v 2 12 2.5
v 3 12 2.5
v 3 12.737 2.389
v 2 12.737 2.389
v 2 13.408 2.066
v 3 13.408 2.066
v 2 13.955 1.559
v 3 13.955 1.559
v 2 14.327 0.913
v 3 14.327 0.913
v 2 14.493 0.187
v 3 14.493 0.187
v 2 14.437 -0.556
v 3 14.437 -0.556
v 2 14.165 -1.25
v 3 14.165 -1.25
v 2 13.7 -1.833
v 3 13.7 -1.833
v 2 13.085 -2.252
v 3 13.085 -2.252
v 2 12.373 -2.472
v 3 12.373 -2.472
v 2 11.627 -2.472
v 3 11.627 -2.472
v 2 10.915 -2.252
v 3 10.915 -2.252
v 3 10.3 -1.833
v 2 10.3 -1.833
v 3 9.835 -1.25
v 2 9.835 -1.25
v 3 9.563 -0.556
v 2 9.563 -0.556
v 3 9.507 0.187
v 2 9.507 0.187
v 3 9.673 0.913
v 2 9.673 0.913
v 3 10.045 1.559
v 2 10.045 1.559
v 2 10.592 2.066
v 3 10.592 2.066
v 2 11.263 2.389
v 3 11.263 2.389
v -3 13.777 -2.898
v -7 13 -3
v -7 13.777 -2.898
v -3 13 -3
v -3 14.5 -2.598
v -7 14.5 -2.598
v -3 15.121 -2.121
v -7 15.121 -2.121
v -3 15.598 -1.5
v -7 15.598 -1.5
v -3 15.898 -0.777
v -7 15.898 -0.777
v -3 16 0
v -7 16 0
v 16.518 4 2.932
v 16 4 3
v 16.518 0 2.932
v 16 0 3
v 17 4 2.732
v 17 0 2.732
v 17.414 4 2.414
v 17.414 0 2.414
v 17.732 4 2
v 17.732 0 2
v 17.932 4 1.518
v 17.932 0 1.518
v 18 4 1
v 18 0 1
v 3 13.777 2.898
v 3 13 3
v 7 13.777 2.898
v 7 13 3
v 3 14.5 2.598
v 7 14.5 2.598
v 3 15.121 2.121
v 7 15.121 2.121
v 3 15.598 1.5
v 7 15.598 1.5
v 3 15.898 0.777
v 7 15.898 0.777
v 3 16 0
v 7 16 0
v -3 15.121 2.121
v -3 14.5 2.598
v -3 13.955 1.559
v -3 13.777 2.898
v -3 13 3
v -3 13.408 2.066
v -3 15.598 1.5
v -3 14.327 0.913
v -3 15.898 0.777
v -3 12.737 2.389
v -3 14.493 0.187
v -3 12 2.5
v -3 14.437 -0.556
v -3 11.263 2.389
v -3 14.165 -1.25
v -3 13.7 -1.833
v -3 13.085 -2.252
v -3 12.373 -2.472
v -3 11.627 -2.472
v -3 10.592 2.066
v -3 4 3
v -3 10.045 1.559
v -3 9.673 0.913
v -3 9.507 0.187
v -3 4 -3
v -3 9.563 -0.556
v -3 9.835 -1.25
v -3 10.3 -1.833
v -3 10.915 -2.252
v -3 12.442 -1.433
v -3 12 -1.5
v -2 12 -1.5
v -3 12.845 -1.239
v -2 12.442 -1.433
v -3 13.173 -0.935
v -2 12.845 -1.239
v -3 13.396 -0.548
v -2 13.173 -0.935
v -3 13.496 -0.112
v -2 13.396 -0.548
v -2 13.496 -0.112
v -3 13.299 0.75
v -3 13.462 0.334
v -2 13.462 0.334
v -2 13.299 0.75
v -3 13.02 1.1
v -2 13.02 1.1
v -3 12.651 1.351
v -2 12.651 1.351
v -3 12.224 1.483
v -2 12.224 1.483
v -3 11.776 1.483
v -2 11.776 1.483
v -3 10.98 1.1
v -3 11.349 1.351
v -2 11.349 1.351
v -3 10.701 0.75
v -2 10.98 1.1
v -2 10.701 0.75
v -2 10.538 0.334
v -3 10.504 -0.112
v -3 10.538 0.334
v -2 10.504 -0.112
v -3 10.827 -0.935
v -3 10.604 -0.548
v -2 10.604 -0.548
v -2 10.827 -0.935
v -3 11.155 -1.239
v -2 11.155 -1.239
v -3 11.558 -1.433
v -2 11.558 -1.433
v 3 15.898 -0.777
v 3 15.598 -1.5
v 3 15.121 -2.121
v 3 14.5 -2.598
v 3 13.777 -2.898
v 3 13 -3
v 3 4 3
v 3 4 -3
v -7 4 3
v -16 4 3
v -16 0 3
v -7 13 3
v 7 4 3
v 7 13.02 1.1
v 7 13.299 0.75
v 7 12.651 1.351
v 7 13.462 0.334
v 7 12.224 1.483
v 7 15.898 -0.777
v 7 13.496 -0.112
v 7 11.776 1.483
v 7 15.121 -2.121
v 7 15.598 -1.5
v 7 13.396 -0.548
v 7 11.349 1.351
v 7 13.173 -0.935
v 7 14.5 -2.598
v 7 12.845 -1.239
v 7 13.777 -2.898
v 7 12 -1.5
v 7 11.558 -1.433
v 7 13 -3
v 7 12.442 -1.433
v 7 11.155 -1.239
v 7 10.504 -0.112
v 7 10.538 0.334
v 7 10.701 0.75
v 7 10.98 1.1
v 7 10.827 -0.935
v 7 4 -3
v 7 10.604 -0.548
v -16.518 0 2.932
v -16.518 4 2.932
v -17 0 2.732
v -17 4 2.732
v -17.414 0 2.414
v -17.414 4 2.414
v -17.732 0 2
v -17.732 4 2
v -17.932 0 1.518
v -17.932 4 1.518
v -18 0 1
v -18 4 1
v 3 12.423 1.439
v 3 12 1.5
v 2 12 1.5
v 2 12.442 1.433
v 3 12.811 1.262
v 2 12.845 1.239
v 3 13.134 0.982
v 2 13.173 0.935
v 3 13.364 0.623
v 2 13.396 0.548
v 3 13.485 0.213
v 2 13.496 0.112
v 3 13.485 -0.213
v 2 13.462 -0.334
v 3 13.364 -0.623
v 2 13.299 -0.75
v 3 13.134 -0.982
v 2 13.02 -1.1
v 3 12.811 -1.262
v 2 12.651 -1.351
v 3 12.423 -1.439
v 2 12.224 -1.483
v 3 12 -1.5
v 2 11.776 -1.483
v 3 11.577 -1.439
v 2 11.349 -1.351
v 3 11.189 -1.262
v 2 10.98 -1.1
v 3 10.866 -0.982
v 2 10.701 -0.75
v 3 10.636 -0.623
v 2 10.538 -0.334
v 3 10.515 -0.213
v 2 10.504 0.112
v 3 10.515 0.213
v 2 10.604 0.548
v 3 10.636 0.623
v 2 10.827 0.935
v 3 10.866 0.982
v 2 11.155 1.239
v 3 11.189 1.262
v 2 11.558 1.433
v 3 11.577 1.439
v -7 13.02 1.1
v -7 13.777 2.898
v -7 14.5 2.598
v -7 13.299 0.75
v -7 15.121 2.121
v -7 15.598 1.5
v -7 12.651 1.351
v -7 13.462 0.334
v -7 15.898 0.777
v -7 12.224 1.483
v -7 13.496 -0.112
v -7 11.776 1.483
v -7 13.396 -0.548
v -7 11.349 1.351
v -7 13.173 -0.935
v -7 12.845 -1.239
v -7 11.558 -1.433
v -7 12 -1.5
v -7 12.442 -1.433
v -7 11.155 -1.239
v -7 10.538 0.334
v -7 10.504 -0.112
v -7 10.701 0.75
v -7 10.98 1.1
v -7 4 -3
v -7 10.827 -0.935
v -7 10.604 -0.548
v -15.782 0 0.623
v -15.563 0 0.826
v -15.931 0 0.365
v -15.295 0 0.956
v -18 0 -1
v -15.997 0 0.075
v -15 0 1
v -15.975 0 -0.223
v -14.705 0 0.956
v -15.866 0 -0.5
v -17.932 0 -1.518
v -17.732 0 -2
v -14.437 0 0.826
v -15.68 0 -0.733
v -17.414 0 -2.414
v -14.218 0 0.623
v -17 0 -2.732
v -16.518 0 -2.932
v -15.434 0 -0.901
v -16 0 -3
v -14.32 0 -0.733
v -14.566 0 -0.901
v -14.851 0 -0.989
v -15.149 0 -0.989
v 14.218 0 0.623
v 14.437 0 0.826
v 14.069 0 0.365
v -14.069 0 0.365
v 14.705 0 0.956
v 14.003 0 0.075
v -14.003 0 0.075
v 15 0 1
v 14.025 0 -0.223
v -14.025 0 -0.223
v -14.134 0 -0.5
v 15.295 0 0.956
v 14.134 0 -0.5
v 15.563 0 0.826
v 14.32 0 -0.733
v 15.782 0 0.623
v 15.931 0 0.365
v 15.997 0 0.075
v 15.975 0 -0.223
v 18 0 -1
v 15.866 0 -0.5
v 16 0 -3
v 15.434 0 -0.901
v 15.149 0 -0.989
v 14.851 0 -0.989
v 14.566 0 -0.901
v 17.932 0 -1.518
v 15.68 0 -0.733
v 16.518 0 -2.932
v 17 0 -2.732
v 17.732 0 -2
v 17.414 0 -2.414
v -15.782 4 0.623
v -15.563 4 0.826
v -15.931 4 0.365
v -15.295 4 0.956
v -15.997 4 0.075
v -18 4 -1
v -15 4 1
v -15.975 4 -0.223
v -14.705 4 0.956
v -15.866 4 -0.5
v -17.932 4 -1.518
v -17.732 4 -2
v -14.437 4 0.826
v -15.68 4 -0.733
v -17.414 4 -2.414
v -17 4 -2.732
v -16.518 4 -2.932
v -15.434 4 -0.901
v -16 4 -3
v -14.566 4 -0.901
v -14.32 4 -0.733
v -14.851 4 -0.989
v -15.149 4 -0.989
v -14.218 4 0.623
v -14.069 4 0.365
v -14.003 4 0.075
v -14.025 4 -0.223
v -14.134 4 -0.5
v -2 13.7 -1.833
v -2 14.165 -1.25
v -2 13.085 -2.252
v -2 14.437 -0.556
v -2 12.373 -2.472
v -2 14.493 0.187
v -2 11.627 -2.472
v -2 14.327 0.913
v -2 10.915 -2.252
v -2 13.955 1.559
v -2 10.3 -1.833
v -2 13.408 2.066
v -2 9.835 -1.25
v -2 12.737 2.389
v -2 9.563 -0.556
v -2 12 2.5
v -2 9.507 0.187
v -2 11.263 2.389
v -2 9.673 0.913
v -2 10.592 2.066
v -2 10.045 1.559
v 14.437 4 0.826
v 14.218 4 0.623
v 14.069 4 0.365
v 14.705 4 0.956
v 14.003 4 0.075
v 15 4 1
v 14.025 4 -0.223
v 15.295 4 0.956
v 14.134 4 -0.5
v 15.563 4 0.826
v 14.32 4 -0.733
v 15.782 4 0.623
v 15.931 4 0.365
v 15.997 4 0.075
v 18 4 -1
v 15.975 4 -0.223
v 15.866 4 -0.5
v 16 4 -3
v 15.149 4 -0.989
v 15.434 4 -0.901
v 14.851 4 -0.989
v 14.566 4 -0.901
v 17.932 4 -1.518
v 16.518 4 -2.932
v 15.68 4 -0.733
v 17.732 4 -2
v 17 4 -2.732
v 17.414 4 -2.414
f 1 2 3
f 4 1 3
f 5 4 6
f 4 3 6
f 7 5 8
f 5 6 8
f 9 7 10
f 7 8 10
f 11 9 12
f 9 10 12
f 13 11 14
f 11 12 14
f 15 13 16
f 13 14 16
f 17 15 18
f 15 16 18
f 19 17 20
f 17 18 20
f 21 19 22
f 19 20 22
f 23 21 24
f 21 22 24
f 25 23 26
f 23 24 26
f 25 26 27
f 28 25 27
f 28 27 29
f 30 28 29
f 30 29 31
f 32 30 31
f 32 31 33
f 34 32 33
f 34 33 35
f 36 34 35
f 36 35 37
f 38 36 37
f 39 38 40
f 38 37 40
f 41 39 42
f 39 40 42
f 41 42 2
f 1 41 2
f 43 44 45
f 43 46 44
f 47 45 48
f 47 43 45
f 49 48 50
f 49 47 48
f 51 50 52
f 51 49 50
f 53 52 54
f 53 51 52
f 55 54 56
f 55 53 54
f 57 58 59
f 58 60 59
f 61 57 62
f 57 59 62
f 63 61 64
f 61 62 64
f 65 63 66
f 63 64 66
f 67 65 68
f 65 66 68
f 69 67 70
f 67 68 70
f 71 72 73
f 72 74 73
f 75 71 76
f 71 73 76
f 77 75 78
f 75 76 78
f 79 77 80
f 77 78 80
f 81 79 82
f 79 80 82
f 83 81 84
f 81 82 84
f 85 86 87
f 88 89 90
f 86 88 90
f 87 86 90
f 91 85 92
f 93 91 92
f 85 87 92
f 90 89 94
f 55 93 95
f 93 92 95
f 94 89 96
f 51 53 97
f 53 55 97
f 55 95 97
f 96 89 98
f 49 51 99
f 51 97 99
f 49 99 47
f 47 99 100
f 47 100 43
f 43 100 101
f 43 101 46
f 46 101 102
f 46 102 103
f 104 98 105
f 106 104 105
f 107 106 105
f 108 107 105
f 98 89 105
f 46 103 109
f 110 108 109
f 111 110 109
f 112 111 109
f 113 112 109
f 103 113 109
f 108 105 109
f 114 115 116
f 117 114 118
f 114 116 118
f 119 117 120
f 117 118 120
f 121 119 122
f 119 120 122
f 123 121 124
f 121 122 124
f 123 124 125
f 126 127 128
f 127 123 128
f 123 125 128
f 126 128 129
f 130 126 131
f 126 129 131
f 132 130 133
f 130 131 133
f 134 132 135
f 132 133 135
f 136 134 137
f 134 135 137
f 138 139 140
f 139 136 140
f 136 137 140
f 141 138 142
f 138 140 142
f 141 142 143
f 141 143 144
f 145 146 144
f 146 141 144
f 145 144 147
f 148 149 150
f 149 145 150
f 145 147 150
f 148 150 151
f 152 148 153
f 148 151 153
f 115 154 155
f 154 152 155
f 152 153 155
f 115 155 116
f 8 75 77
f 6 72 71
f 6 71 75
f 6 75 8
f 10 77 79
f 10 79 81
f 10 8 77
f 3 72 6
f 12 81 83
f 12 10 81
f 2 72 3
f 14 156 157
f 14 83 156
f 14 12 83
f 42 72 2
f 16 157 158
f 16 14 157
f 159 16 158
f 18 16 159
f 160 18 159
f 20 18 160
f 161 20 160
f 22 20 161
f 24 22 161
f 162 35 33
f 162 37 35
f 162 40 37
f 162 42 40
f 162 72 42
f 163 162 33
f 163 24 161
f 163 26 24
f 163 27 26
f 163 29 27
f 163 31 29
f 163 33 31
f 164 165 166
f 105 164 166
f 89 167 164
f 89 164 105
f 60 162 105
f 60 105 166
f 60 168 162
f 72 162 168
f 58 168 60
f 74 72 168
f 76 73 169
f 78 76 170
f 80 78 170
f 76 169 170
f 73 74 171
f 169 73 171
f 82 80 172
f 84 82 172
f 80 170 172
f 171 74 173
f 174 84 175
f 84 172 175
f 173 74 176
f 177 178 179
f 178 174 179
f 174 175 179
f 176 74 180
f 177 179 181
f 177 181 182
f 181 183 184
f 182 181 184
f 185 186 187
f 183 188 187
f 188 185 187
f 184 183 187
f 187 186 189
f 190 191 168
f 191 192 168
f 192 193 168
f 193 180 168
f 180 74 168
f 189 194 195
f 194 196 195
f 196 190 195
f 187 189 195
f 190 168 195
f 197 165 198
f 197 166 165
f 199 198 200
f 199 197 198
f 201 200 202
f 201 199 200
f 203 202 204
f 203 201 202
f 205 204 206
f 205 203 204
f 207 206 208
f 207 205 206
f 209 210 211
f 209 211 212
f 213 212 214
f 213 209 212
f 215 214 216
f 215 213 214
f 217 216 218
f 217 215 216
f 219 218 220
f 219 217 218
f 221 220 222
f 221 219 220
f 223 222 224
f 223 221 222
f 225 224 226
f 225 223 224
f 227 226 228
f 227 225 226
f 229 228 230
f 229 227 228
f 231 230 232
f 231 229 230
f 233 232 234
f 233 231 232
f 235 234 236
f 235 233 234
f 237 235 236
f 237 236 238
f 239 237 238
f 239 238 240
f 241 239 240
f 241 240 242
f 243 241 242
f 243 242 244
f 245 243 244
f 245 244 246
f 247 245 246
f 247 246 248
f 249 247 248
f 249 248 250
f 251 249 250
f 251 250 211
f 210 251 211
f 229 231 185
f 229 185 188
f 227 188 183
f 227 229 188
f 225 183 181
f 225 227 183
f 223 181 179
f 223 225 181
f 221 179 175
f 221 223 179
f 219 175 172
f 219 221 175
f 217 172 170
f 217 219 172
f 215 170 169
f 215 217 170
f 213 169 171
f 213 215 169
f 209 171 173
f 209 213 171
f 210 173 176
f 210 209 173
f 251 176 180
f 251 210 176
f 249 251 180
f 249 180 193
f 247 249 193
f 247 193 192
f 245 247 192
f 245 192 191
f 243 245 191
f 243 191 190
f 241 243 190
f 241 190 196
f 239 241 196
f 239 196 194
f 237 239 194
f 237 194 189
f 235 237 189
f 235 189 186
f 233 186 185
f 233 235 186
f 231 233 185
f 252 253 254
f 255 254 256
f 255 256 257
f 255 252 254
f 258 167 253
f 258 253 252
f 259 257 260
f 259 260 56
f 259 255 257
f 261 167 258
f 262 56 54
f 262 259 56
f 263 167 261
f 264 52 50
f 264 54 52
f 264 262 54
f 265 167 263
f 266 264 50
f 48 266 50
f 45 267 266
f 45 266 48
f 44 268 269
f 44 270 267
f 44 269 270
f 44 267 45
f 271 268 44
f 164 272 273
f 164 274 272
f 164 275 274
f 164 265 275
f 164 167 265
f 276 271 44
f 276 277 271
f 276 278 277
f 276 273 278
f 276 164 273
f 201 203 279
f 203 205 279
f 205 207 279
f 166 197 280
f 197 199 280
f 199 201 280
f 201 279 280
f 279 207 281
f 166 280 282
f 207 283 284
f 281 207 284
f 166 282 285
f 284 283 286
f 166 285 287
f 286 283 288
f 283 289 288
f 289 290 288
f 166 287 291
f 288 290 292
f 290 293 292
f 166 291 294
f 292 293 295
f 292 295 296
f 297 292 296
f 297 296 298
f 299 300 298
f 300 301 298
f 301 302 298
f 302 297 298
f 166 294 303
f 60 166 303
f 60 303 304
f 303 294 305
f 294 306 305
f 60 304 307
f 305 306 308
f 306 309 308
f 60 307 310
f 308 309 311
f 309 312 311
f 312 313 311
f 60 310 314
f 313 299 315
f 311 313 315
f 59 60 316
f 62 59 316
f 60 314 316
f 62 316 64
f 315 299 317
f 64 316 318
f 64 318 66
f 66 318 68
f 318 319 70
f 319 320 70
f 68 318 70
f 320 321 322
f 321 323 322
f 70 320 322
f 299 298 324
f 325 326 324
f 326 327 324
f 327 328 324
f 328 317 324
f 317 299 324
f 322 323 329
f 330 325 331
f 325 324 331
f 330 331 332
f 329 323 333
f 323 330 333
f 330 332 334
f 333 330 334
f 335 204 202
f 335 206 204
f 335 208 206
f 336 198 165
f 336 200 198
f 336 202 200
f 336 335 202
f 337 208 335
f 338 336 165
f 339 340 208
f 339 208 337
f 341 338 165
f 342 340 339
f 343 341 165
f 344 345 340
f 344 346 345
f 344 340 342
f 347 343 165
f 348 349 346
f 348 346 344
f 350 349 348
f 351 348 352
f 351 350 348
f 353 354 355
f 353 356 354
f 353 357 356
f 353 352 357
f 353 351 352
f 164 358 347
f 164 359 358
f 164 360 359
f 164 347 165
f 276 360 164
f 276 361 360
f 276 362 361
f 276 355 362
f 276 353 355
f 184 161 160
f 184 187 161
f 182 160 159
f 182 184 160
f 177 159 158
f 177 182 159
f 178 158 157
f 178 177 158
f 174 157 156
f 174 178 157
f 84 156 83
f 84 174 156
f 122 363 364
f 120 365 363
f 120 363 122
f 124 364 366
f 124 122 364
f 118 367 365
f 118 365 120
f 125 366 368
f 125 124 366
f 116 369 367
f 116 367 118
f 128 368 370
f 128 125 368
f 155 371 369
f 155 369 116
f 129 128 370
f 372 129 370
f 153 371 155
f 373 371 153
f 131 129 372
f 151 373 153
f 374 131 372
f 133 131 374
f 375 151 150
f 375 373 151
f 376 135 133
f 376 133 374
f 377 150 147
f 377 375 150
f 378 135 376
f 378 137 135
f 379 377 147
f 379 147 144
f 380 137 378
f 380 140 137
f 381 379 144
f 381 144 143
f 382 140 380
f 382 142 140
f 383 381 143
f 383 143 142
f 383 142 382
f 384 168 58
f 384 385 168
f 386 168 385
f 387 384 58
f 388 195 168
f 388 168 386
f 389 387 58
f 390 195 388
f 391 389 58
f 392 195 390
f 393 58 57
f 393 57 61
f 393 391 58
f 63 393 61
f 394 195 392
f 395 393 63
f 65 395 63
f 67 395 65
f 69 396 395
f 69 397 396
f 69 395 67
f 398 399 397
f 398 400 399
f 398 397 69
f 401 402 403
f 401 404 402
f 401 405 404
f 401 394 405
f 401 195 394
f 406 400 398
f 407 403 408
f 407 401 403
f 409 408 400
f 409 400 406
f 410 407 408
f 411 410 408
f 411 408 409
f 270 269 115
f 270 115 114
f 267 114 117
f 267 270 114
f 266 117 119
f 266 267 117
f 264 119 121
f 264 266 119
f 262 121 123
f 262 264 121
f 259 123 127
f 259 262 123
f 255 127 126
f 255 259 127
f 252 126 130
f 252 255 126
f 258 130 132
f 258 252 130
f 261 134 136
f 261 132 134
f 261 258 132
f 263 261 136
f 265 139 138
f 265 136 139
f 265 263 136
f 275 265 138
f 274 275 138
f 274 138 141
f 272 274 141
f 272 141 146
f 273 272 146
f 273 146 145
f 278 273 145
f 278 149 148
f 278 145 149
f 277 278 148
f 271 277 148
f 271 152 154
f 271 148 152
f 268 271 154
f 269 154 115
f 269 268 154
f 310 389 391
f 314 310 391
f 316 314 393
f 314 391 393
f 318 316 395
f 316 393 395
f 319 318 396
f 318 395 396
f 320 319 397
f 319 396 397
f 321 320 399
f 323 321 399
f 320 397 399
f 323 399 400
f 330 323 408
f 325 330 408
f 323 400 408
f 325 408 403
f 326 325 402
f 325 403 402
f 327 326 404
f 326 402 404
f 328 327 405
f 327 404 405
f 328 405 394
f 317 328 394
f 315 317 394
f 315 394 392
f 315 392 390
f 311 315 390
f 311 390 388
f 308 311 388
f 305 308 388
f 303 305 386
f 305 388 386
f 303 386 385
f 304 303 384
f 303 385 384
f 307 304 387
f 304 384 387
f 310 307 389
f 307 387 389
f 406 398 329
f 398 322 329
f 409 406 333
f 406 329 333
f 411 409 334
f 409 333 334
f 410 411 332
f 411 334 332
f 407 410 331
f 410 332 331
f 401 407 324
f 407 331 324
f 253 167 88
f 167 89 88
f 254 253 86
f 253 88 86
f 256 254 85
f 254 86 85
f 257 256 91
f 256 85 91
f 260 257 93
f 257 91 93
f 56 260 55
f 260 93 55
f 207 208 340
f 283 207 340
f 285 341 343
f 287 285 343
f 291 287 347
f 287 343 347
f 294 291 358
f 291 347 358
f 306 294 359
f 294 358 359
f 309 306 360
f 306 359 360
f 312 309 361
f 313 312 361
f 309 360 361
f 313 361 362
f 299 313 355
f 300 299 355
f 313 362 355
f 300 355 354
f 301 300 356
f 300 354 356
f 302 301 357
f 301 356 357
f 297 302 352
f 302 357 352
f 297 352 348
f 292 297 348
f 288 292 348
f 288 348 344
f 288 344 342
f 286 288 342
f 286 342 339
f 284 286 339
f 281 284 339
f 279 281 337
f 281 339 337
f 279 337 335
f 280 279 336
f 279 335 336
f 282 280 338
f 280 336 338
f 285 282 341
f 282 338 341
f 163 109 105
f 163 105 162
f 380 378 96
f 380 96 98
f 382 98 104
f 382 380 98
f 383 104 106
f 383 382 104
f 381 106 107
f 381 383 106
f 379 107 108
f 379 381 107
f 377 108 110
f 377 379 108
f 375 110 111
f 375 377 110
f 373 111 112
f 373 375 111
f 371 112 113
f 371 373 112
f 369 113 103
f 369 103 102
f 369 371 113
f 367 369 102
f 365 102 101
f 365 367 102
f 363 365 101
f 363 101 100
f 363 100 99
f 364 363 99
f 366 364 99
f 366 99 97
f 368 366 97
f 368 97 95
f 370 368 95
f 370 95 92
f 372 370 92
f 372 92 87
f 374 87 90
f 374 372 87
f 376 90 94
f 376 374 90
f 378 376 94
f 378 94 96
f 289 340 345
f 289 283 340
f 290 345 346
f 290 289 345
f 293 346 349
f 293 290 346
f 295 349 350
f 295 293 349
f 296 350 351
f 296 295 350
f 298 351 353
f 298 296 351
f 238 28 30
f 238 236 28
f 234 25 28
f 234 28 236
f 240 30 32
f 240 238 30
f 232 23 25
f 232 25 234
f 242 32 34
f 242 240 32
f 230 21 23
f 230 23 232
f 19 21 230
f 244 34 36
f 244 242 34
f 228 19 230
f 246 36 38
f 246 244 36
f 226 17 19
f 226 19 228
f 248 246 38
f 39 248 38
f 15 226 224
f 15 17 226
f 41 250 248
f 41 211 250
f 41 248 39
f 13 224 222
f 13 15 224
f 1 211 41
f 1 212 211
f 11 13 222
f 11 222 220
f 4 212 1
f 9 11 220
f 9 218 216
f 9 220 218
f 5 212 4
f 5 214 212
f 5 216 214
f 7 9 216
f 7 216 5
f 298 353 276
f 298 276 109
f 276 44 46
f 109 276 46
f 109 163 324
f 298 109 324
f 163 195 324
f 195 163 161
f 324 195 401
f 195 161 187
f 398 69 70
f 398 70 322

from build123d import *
from build123d.topology import SkipClean

# Parameters (mm, degrees)
SKETCH2_W               = 14
SKETCH2_H               = 6
BOSS_EXTRUDE1_DEPTH     = 4
SKETCH3_W               = 4
SKETCH3_H               = 6
BOSS_EXTRUDE2_DEPTH     = 12
CUT_EXTRUDE1_DEPTH      = 22.470910554
CUT_EXTRUDE1_DEPTH_BACK = 22.470910554
SKETCH4_R               = 1.5
BOSS_EXTRUDE3_START     = 1
SKETCH5_R               = 2.5
SKETCH5_R_2             = 1.5
BOSS_EXTRUDE3_DEPTH     = 1
SKETCH6_R               = 2.5
SKETCH6_R_2             = 1.5
BOSS_EXTRUDE4_DEPTH     = 1
SKETCH7_W               = 11
SKETCH7_H               = 6
SKETCH7_R               = 1
BOSS_EXTRUDE5_DEPTH     = 4
FILLET1_R               = 2
FILLET2_R               = 3


with BuildPart() as part:
    # Sketch2 → Boss-Extrude1 (new body)
    with BuildSketch(Plane(origin=(0, 0, 0), x_dir=(1, 0, 0), z_dir=(0, 1, 0))):
        Rectangle(SKETCH2_W, SKETCH2_H)
    extrude(amount=BOSS_EXTRUDE1_DEPTH)

    # Sketch3 → Boss-Extrude2 (add)
    with BuildSketch(Plane(origin=(0, 4, 0), x_dir=(1, 0, 0), z_dir=(0, 1, 0))):
        with Locations((-5, 0)):
            Rectangle(SKETCH3_W, SKETCH3_H)
        with Locations((5, 0)):
            Rectangle(SKETCH3_W, SKETCH3_H)
    extrude(amount=BOSS_EXTRUDE2_DEPTH)

    # Sketch4 → Cut-Extrude1 (cut, two sides: drawn at the far end of the back side and taken through both)
    with BuildSketch(Plane(origin=(7, 0, 0), x_dir=(0, 0, -1), z_dir=(1, 0, 0)).offset(-CUT_EXTRUDE1_DEPTH_BACK)):
        with Locations((0, 12)):
            Circle(SKETCH4_R)
    extrude(amount=CUT_EXTRUDE1_DEPTH + CUT_EXTRUDE1_DEPTH_BACK, mode=Mode.SUBTRACT)

    # Sketch5 → Boss-Extrude3 (add)
    with BuildSketch(Plane(origin=(-3, 0, 0), x_dir=(0, 0, -1), z_dir=(1, 0, 0)).offset(BOSS_EXTRUDE3_START)):
        with Locations(Location((0, 12, 0), (0, 0, 180))):
            Circle(SKETCH5_R)
        with Locations((0, 12)):
            Circle(SKETCH5_R_2, mode=Mode.SUBTRACT)
    extrude(amount=-BOSS_EXTRUDE3_DEPTH)

    # Sketch6 → Boss-Extrude4 (add)
    with SkipClean():  # the faces are left unmerged after this step: merging them gives an invalid solid
        with BuildSketch(Plane.ZY.offset(-3)):
            with Locations((0, 12)):
                Circle(SKETCH6_R)
            with Locations((0, 12)):
                Circle(SKETCH6_R_2, mode=Mode.SUBTRACT)
        extrude(amount=BOSS_EXTRUDE4_DEPTH)

    # Sketch7 → Boss-Extrude5 (add)
    # profile 1 of 2: a face of its own
    with SkipClean():  # the faces are left unmerged after this step: merging them gives an invalid solid
        with BuildSketch(Plane(origin=(0, 4, 0), x_dir=(1, 0, 0), z_dir=(0, 1, 0))):
            with Locations((12.5, 0)):
                Rectangle(SKETCH7_W, SKETCH7_H)
            with Locations(Location((15, 0, 0), (0, 0, 270))):
                Circle(SKETCH7_R, mode=Mode.SUBTRACT)
        # profile 2 of 2: a face of its own
        with BuildSketch(Plane(origin=(0, 4, 0), x_dir=(1, 0, 0), z_dir=(0, 1, 0))):
            with Locations((-12.5, 0)):
                Rectangle(SKETCH7_W, SKETCH7_H)
            with Locations(Location((-15, 0, 0), (0, 0, 270))):
                Circle(SKETCH7_R, mode=Mode.SUBTRACT)
        extrude(amount=-BOSS_EXTRUDE5_DEPTH)

    # Fillet1
    fillet1_edges = [part.edges().sort_by_distance(p)[0] for p in [
        (18, 2, -3),
        (18, 2, 3),
        (-18, 2, 3),
        (-18, 2, -3),
    ]]
    fillet(fillet1_edges, radius=FILLET1_R)

    # Fillet2
    fillet2_edges = [part.edges().sort_by_distance(p)[0] for p in [
        (-5, 16, -3),
        (5, 16, -3),
        (5, 16, 3),
        (-5, 16, 3),
    ]]
    fillet(fillet2_edges, radius=FILLET2_R - 0.0001)  # a hair under: the kernel refuses the full size


solid = part.part
